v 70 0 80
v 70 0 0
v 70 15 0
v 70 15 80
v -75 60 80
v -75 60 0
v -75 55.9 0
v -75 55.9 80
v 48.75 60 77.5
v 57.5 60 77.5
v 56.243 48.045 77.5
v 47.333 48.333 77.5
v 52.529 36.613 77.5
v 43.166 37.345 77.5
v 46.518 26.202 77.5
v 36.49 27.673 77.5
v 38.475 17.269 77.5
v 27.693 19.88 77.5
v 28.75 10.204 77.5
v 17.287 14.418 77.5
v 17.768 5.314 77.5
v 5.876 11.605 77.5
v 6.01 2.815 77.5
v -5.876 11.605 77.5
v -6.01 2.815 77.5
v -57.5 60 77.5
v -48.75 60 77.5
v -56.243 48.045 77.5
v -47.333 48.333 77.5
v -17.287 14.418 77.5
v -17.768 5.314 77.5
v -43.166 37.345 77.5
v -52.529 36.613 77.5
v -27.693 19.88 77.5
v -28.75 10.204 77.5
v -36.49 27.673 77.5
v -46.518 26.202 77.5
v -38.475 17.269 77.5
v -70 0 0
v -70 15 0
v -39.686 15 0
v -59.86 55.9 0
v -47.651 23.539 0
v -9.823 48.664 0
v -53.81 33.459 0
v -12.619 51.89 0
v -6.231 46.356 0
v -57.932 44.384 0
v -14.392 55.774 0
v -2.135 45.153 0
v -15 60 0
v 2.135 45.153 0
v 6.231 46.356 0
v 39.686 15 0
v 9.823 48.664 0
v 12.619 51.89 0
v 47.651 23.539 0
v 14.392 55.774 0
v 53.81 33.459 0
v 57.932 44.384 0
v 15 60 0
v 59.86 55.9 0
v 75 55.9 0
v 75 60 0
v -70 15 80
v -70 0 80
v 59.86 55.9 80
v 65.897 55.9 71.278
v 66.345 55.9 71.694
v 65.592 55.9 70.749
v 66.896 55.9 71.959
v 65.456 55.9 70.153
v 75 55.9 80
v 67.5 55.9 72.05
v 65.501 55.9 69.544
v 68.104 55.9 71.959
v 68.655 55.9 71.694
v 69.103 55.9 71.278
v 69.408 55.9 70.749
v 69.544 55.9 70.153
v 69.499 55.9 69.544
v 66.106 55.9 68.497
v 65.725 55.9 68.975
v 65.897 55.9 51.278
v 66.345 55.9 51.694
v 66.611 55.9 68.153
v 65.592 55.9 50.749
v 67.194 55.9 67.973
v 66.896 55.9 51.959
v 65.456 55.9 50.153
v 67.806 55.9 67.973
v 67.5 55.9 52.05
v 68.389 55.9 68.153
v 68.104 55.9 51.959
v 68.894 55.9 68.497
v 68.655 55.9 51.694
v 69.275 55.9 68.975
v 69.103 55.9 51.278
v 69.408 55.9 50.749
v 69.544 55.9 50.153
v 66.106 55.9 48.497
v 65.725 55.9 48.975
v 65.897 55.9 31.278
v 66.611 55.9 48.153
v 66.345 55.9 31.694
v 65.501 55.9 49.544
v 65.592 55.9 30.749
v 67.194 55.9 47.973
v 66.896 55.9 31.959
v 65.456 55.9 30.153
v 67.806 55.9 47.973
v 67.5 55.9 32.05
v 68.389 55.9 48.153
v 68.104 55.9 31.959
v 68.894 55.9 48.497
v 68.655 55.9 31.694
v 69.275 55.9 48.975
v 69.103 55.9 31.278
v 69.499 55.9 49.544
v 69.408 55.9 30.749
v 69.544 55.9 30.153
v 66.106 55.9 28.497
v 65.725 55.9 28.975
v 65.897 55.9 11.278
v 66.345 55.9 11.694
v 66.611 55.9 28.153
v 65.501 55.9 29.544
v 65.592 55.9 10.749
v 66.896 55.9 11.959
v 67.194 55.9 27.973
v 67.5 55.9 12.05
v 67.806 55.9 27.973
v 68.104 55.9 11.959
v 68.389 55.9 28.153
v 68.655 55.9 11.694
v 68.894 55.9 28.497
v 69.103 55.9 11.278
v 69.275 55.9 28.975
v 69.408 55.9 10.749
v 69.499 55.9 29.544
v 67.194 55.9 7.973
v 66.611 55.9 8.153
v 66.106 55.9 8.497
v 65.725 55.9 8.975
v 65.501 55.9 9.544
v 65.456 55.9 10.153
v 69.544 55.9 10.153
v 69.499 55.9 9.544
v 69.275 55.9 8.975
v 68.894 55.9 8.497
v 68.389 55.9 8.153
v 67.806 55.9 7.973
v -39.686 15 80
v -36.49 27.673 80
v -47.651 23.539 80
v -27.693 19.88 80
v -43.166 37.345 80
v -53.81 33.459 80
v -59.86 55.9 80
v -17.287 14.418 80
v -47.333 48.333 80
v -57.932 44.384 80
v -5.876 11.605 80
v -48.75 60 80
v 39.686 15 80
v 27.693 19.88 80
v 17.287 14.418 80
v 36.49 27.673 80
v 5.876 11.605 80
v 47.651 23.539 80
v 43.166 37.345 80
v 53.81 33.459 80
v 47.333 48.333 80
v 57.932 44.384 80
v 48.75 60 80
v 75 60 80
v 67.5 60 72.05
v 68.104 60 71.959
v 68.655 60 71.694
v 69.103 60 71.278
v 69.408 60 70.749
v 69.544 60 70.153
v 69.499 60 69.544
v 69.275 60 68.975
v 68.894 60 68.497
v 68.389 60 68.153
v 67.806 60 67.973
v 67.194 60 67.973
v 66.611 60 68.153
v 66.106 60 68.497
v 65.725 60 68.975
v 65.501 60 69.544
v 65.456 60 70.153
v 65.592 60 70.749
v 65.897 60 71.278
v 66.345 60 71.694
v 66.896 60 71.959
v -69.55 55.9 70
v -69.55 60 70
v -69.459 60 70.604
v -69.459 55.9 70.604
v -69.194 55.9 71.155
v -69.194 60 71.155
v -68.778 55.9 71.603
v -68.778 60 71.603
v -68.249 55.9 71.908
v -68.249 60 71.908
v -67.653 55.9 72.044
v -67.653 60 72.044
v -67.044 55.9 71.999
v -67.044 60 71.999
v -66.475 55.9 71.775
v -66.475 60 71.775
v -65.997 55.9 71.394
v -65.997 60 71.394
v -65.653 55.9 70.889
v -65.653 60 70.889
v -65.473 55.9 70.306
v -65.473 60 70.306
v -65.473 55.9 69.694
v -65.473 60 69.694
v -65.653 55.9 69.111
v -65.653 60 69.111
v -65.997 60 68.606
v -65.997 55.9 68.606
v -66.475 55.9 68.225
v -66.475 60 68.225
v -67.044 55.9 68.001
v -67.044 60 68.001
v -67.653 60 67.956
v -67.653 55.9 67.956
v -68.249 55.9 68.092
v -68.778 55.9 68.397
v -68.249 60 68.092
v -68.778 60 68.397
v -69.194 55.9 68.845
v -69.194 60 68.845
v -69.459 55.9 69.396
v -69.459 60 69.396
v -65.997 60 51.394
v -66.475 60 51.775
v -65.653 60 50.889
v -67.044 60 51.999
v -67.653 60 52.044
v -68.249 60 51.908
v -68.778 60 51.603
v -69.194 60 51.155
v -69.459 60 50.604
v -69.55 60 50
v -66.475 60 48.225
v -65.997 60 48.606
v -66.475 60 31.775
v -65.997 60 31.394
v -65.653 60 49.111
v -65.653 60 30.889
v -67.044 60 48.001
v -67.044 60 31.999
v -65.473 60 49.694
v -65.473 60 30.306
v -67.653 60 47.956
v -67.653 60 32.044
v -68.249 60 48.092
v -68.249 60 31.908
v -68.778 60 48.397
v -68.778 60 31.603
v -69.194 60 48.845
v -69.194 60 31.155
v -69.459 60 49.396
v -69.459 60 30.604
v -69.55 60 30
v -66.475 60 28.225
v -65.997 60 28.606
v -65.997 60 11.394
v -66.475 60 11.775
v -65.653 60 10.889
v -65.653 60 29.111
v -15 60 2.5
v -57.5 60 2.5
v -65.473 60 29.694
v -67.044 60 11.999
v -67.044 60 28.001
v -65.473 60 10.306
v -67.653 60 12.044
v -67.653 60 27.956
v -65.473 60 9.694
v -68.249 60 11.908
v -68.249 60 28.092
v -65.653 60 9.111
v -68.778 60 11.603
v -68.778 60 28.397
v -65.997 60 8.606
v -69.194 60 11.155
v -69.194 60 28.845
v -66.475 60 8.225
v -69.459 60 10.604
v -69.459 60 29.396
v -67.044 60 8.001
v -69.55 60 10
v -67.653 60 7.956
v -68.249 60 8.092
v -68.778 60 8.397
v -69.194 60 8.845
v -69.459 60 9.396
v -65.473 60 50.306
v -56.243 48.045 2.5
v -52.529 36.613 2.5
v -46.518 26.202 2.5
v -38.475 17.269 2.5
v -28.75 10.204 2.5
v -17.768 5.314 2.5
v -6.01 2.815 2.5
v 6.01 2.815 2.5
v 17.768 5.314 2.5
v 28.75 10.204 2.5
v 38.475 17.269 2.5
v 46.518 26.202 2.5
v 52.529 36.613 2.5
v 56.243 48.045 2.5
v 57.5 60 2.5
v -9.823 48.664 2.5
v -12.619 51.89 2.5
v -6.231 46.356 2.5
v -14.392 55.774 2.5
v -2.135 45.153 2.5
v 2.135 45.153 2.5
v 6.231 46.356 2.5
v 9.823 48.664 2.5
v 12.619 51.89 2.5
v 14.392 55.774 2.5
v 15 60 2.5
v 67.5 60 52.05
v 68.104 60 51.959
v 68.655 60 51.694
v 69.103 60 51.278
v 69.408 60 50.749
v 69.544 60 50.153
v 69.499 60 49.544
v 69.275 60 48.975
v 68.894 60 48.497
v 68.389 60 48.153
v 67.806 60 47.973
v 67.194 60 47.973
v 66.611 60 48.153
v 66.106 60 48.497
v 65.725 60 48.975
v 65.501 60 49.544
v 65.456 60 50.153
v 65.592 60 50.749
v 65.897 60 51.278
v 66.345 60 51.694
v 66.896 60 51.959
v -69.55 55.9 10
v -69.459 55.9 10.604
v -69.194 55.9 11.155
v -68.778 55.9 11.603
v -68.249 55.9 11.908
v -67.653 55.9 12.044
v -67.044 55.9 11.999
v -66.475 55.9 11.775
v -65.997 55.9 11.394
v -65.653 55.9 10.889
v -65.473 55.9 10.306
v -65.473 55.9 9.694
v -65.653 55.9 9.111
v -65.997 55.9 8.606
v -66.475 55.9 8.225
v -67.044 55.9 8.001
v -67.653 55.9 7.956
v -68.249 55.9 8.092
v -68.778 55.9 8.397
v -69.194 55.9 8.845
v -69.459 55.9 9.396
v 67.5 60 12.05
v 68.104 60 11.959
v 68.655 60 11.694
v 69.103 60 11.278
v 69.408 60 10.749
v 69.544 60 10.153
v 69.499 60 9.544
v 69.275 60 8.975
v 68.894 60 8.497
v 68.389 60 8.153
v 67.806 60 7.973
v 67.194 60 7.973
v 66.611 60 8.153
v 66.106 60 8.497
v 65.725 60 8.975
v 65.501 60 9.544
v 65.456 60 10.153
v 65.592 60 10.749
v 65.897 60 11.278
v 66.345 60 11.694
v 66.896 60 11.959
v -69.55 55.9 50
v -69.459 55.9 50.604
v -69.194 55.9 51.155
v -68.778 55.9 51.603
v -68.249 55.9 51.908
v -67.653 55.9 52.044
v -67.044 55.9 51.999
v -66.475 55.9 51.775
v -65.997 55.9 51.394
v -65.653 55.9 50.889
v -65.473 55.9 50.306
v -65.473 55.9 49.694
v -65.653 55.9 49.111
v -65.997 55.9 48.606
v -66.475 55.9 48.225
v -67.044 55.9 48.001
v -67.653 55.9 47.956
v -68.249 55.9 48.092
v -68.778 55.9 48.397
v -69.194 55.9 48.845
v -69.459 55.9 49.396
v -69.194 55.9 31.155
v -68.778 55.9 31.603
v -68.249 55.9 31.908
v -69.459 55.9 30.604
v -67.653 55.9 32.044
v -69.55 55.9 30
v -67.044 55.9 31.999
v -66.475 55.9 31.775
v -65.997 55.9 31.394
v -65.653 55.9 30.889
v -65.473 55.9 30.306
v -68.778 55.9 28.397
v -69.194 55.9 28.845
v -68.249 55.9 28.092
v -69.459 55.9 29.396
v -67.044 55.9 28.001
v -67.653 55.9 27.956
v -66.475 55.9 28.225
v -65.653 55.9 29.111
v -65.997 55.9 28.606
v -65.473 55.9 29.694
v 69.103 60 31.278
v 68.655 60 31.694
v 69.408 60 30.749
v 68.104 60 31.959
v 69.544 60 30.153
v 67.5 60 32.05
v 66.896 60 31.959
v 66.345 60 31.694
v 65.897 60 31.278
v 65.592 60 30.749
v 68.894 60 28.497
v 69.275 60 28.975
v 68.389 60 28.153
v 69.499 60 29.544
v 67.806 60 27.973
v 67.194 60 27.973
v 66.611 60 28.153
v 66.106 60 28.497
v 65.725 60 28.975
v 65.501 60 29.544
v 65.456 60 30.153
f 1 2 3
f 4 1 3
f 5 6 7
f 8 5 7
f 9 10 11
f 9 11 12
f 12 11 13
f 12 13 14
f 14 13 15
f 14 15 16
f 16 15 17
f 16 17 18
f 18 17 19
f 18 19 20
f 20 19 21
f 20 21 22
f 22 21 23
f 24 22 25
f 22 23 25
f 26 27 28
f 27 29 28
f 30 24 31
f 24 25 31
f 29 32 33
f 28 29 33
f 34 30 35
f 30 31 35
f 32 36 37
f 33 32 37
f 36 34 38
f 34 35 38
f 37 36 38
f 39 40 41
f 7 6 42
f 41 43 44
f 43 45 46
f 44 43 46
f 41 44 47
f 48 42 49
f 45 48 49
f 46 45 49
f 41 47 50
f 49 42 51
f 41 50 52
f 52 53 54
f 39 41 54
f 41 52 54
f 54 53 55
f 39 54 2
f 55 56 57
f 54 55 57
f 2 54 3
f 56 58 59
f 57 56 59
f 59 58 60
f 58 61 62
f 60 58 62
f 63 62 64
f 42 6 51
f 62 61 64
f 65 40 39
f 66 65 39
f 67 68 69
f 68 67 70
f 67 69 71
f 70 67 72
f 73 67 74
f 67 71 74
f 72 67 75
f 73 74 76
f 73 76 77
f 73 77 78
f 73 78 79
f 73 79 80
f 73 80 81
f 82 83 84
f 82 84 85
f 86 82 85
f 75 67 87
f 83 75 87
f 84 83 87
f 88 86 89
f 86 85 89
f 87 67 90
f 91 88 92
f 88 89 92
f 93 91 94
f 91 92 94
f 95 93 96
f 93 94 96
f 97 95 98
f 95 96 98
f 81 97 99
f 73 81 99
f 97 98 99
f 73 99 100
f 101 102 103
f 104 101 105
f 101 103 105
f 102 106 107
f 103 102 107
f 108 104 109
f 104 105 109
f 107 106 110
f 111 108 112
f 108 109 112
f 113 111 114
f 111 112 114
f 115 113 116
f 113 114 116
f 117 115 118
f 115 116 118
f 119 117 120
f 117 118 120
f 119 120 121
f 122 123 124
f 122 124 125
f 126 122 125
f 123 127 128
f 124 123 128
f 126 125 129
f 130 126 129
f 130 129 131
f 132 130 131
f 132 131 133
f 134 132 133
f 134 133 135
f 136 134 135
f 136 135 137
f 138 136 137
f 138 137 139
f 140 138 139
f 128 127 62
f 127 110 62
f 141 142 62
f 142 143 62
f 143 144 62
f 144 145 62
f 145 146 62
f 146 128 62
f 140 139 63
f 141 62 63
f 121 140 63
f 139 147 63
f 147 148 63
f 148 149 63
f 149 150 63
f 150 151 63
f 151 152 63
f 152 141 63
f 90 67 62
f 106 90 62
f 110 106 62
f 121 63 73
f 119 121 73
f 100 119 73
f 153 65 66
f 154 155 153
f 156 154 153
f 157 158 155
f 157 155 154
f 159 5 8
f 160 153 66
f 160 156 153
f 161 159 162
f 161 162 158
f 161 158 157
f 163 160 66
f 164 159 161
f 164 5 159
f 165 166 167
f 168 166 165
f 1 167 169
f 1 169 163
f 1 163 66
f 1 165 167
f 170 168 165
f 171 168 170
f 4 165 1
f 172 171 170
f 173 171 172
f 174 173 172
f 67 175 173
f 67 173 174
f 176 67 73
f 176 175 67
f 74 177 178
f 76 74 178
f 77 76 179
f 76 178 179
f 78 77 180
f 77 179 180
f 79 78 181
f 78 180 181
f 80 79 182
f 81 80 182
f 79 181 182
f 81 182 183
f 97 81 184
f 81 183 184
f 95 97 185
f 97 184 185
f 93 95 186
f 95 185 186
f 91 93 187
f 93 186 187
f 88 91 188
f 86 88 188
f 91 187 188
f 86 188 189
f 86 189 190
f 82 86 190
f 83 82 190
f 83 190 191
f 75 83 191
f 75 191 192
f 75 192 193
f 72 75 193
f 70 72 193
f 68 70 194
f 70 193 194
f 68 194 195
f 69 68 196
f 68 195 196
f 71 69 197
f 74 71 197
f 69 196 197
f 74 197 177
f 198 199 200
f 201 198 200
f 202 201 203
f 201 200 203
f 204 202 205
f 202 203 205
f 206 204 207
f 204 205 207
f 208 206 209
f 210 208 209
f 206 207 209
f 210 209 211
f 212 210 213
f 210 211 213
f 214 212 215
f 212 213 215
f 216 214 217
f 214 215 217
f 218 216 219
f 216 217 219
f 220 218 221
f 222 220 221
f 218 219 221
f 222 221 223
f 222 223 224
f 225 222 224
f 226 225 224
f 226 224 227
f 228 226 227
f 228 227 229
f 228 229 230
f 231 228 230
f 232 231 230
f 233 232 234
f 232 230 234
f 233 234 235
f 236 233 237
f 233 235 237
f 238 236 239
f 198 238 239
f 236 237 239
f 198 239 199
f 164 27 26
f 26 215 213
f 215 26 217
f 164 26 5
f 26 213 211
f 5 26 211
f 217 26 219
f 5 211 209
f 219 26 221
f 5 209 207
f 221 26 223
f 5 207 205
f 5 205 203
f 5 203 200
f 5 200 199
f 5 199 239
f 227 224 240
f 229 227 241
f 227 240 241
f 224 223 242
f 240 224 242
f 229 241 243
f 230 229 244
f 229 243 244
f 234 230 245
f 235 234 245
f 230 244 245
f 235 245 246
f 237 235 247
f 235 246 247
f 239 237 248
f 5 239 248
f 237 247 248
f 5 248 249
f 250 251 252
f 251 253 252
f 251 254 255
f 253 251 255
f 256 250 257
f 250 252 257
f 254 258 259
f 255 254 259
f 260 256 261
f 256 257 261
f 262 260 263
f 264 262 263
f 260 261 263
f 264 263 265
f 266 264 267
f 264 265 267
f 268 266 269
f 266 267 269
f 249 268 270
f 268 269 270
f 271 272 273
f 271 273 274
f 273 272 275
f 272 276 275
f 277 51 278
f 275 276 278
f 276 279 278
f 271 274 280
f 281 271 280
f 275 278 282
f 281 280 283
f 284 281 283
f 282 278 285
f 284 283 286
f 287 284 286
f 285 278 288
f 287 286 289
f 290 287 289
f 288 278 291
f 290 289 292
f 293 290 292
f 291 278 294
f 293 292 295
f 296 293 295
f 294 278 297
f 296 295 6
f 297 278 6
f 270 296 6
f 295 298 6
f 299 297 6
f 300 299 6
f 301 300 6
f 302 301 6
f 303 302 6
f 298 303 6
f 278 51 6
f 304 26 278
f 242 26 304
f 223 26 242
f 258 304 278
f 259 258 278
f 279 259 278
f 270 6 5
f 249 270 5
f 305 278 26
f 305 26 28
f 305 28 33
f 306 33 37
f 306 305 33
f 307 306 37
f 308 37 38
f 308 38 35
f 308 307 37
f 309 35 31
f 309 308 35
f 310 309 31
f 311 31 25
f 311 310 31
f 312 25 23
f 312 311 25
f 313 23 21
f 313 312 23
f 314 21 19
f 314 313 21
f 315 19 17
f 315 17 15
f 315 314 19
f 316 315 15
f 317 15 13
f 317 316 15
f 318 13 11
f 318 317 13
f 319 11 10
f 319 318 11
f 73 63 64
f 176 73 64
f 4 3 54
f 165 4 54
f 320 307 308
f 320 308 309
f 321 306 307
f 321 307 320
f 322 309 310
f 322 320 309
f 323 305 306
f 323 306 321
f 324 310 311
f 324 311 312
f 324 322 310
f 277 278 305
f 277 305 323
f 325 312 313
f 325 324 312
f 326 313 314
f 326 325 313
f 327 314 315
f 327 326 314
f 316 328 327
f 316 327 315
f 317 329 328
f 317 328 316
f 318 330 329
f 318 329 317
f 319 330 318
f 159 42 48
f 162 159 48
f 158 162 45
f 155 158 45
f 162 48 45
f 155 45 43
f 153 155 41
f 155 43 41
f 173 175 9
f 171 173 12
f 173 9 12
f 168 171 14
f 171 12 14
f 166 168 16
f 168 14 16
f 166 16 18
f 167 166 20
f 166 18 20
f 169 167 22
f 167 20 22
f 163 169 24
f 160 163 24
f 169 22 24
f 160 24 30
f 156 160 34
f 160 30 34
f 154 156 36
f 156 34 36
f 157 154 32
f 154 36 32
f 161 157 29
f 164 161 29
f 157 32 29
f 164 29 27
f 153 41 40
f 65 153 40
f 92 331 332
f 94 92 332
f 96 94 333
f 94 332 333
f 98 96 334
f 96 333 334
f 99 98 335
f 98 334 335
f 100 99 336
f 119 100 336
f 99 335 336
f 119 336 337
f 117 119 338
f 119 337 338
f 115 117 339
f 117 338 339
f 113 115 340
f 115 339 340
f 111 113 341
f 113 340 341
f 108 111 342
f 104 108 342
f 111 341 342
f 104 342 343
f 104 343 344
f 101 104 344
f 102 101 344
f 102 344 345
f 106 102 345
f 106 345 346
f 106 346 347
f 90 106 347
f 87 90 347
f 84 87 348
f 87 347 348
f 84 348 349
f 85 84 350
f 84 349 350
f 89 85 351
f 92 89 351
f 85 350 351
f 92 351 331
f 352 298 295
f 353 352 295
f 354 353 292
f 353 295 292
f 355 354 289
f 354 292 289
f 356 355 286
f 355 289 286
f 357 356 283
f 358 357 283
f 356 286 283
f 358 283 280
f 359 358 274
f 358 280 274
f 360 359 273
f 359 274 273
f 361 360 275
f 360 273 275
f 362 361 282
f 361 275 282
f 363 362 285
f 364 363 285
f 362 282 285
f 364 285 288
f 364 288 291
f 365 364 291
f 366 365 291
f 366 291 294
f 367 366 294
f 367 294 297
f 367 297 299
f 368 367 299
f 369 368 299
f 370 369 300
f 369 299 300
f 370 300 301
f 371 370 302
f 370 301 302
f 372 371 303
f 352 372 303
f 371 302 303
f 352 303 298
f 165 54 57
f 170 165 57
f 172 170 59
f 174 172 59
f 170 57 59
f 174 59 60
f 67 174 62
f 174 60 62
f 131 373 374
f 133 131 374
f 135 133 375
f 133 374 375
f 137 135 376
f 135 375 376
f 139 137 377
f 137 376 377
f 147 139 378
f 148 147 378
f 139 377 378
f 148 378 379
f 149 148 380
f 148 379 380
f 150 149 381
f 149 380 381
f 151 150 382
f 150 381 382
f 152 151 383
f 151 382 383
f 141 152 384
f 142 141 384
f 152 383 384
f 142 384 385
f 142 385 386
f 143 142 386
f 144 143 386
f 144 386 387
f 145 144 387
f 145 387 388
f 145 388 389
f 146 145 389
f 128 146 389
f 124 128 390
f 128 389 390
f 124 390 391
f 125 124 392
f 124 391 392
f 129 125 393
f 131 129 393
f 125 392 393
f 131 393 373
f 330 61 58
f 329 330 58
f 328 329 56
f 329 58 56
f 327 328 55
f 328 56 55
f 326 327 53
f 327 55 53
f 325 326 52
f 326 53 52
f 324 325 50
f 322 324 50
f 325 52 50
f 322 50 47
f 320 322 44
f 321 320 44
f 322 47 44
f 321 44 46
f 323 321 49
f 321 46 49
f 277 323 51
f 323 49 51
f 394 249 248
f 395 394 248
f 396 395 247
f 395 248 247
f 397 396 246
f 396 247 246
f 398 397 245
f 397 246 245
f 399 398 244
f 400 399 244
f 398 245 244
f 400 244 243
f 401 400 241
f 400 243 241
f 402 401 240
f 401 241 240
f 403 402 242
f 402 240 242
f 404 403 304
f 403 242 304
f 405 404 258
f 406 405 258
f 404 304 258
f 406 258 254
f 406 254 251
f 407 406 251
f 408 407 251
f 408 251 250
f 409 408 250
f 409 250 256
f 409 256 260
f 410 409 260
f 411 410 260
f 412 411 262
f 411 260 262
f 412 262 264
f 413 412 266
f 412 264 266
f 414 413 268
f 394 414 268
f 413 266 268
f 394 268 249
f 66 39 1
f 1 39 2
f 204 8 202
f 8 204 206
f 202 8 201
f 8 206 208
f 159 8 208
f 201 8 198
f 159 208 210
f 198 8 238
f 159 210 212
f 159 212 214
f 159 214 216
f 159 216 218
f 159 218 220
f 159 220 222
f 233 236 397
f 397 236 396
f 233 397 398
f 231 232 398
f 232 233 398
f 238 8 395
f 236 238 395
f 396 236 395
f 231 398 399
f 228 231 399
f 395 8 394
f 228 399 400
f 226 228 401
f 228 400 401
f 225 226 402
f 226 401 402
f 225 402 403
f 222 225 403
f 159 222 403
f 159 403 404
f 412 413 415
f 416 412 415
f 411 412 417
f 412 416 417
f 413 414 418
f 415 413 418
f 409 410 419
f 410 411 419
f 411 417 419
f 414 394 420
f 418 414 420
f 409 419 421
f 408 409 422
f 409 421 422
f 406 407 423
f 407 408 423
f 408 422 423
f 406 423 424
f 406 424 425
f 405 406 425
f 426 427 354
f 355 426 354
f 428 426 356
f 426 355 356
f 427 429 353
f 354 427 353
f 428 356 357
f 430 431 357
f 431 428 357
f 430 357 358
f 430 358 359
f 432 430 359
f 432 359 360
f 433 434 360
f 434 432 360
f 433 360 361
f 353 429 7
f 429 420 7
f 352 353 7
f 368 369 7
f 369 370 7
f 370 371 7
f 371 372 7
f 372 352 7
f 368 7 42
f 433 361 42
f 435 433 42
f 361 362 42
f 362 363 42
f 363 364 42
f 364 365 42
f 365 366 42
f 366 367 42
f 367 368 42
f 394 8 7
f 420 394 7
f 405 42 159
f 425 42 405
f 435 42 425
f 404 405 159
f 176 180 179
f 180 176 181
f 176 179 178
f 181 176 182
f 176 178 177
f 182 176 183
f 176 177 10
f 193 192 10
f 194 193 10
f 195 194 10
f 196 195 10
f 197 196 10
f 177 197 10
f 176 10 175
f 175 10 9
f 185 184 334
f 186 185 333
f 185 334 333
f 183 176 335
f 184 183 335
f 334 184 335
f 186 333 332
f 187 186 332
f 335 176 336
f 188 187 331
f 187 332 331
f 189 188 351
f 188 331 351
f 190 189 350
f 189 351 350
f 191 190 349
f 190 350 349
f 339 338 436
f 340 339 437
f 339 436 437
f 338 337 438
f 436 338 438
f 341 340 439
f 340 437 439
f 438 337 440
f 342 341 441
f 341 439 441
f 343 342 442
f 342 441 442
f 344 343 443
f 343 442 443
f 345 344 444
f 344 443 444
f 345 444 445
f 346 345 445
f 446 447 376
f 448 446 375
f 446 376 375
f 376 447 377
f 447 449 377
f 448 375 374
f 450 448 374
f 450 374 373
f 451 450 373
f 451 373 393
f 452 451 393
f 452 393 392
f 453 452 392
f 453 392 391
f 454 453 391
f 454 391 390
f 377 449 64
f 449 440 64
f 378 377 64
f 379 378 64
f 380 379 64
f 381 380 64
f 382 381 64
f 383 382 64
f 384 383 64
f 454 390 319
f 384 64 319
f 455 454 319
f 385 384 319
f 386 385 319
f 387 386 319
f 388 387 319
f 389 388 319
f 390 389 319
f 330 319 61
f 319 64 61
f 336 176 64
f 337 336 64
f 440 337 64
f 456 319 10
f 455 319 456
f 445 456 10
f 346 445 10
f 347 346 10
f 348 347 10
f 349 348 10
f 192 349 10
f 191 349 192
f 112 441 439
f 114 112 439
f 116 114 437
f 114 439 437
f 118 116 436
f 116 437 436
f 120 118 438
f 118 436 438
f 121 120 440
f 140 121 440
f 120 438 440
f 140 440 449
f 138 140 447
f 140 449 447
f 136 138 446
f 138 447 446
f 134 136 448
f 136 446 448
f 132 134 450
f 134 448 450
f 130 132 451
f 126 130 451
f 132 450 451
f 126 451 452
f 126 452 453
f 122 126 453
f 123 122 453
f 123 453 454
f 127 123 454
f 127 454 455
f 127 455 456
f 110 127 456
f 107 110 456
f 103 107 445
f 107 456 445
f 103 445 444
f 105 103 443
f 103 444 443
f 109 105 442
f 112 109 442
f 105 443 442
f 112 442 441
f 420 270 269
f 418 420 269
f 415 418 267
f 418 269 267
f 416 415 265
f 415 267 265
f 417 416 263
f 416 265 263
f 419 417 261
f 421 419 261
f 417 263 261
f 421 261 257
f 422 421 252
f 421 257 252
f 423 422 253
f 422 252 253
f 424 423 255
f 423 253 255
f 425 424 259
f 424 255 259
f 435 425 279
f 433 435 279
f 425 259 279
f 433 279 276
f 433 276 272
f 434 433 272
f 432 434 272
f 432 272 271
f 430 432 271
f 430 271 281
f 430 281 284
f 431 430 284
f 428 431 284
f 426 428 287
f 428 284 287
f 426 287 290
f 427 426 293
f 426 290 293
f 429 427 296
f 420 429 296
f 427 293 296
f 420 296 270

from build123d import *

# Parameters (mm, degrees)
BOSS_EXTRUDE1_DEPTH = 80
BOSS_EXTRUDE2_DEPTH = 2.5
SKETCH4_W           = 8.75
SKETCH4_H           = 75
SKETCH5_R           = 2.05
CUT_EXTRUDE1_DEPTH  = 4.1


with BuildPart() as part:
    # Sketch1 → Boss-Extrude1 (new body)
    with BuildSketch(Plane.XY):
        with BuildLine():
            Line((-70, 0), (70, 0))
            Line((70, 0), (70, 15))
            Line((70, 15), (39.686269666, 15))
            ThreePointArc((39.686269666, 15), (53.810362803, 33.458619949), (59.859752756, 55.9))
            Line((59.859752756, 55.9), (75, 55.9))
            Line((75, 55.9), (75, 60))
            Line((75, 60), (48.75, 60))
            ThreePointArc((48.75, 60), (0, 11.25), (-48.75, 60))
            Line((-48.75, 60), (-75, 60))
            Line((-75, 60), (-75, 55.9))
            Line((-75, 55.9), (-59.859752756, 55.9))
            ThreePointArc((-59.859752756, 55.9), (-53.810362803, 33.458619949), (-39.686269666, 15))
            Line((-39.686269666, 15), (-70, 15))
            Line((-70, 15), (-70, 0))
        make_face()
    extrude(amount=BOSS_EXTRUDE1_DEPTH)

    # Sketch3 → Boss-Extrude2 (add)
    with BuildSketch(Plane(origin=(0, 0, 0), x_dir=(-1, 0, 0), z_dir=(0, 0, -1))):
        with BuildLine():
            ThreePointArc((-15, 60), (0, 45), (15, 60))
            Line((15, 60), (48.75, 60))
            ThreePointArc((48.75, 60), (0, 11.25), (-48.75, 60))
            Line((-48.75, 60), (-15, 60))
        make_face()
    extrude(amount=-BOSS_EXTRUDE2_DEPTH)

    # Sketch4 → Cut-Revolve1 (revolve, cut)
    with BuildSketch(Plane(origin=(0, 60, 0), x_dir=(1, 0, 0), z_dir=(0, 1, 0))):
        with Locations((-53.125, -40)):
            Rectangle(SKETCH4_W, SKETCH4_H)
    revolve(axis=Axis((0, 60, 0), (0, 0, 1)), mode=Mode.SUBTRACT)

    # Sketch5 → Cut-Extrude1 (cut)
    with BuildSketch(Plane(origin=(0, 60, 0), x_dir=(1, 0, 0), z_dir=(0, 1, 0))):
        with Locations(Location((67.5, -70, 0), (0, 0, 270))):
            Circle(SKETCH5_R)
        with Locations(Location((67.5, -50, 0), (0, 0, 270))):
            Circle(SKETCH5_R)
        with Locations(Location((67.5, -30, 0), (0, 0, 270))):
            Circle(SKETCH5_R)
        with Locations(Location((67.5, -10, 0), (0, 0, 270))):
            Circle(SKETCH5_R)
        with Locations(Location((-67.5, -10, 0), (0, 0, 180))):
            Circle(SKETCH5_R)
        with Locations(Location((-67.5, -30, 0), (0, 0, 180))):
            Circle(SKETCH5_R)
        with Locations(Location((-67.5, -50, 0), (0, 0, 180))):
            Circle(SKETCH5_R)
        with Locations(Location((-67.5, -70, 0), (0, 0, 180))):
            Circle(SKETCH5_R)
    extrude(amount=-CUT_EXTRUDE1_DEPTH, mode=Mode.SUBTRACT)


solid = part.part
